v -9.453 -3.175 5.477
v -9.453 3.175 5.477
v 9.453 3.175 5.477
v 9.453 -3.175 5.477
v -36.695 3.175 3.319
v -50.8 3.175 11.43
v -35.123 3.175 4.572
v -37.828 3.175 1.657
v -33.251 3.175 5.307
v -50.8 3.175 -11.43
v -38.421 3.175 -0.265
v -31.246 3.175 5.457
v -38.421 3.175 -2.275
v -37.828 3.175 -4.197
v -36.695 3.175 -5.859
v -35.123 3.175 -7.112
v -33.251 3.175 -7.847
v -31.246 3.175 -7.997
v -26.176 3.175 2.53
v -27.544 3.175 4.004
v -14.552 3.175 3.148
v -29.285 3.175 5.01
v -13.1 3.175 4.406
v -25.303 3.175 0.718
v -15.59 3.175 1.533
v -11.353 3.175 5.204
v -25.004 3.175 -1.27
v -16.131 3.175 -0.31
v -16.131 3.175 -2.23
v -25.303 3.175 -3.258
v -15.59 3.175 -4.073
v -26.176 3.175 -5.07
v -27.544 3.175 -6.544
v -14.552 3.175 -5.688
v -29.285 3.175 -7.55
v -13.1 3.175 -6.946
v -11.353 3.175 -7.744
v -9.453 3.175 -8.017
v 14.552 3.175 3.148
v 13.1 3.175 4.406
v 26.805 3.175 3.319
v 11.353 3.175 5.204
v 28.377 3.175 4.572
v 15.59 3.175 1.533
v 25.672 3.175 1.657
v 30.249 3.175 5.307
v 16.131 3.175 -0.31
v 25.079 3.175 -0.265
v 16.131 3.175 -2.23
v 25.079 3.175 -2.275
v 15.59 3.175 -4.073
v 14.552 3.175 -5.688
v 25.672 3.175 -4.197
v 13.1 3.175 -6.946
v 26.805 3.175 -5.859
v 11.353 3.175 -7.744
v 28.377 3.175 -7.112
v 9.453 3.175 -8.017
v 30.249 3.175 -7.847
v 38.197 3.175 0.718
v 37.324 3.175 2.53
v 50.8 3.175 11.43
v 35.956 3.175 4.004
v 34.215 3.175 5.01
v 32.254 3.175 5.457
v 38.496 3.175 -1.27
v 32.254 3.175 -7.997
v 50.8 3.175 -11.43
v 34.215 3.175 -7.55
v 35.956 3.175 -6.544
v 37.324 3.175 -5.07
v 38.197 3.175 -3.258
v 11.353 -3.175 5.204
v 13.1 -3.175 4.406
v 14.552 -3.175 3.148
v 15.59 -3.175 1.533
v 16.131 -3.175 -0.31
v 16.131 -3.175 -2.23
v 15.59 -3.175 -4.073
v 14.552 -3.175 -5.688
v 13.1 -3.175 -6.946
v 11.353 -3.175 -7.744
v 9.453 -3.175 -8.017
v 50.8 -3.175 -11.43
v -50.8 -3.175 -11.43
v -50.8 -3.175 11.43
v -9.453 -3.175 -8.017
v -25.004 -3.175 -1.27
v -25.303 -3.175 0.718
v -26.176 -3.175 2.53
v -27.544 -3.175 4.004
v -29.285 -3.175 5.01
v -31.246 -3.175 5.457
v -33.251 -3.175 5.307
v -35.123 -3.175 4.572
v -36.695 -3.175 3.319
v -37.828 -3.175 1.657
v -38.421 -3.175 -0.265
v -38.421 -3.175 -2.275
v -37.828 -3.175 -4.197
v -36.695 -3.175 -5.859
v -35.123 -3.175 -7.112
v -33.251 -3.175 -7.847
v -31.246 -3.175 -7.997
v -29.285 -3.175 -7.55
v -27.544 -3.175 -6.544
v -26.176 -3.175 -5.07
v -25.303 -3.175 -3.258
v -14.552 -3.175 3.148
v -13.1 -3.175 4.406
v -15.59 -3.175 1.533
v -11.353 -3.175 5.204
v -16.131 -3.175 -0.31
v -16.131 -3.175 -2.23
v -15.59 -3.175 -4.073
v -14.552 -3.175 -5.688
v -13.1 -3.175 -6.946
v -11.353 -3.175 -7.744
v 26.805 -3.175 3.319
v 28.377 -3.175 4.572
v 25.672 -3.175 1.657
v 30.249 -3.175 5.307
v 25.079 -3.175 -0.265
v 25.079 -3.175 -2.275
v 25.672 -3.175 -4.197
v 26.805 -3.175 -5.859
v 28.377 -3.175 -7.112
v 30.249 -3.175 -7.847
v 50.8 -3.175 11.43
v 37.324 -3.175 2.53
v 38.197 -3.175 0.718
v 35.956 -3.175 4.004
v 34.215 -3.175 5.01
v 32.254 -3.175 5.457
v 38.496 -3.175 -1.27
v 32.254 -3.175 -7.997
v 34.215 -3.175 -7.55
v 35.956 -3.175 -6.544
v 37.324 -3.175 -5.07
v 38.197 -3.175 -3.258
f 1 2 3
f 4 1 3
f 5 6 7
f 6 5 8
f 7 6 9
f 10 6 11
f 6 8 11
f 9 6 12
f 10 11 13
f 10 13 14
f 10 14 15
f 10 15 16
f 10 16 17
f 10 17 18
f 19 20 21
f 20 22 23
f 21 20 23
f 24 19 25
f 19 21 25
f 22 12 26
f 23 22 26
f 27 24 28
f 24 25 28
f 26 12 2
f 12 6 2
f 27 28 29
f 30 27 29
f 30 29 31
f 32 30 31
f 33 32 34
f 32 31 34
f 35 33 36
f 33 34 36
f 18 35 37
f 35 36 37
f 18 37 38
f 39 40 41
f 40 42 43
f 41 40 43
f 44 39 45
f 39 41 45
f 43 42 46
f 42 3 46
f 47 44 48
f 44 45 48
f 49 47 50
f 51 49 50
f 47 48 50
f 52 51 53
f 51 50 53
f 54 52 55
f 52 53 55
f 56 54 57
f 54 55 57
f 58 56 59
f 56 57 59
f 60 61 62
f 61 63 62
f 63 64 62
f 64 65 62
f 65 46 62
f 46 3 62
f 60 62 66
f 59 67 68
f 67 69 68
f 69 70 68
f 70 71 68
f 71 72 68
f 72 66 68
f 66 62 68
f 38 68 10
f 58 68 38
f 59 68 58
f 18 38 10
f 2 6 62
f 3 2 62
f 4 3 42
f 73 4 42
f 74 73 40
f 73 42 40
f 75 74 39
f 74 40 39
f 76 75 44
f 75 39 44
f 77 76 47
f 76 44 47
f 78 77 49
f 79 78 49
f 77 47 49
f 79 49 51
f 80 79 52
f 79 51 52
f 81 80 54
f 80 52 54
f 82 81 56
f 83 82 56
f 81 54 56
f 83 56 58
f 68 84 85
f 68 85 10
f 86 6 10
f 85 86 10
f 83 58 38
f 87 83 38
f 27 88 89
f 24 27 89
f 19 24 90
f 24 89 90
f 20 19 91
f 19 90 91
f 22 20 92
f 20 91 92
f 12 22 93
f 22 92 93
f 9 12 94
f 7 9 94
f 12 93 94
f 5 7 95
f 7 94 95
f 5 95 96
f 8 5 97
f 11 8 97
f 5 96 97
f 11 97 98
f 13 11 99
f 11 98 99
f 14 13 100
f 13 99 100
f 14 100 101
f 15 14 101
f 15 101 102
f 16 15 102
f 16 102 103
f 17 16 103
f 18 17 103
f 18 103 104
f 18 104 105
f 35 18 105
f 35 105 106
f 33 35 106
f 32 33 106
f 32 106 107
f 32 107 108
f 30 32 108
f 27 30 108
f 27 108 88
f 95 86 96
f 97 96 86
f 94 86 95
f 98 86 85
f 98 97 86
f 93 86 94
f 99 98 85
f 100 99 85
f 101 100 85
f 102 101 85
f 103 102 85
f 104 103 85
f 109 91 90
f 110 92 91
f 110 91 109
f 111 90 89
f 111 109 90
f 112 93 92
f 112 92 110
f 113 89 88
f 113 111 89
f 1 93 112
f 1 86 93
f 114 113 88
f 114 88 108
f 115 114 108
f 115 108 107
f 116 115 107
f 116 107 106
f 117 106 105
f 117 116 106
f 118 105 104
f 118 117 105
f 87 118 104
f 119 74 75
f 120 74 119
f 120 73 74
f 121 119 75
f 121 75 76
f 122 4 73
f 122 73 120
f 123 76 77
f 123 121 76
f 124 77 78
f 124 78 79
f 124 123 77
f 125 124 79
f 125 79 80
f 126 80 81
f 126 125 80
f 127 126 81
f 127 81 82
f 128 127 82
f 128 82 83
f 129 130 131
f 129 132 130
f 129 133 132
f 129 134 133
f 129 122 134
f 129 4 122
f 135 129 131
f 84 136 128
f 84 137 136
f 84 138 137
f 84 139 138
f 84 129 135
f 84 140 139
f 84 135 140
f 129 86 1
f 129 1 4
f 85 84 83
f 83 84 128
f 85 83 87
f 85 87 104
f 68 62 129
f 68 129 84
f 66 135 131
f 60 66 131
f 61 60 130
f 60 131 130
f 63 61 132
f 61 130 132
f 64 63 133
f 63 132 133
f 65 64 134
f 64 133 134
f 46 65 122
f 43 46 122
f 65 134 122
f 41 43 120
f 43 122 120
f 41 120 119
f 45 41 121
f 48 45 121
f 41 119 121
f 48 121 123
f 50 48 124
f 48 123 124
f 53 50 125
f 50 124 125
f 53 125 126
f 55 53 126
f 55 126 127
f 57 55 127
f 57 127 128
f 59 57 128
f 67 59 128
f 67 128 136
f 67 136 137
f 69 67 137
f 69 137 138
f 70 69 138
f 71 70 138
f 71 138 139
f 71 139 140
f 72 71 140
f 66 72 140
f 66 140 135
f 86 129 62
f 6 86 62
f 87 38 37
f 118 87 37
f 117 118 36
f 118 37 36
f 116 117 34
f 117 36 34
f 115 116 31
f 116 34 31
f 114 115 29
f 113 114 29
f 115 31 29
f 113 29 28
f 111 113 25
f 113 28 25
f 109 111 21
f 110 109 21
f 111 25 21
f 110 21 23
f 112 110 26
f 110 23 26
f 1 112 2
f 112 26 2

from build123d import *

# Parameters (mm, degrees)
SKETCH1_W               = 22.86
SKETCH1_H               = 6.35
EXTRUDE1_DEPTH          = 50.8
EXTRUDE1_DEPTH_BACK     = 50.8
F_1_2_CLEARANCE_HOLE1_D = 13.49248
CUT_EXTRUDE1_DEPTH      = 7.35


with BuildPart() as part:
    # Sketch1 → Extrude1 (new body, two sides)
    with BuildSketch(Plane(origin=(0, 0, 0), x_dir=(0, 0, -1), z_dir=(1, 0, 0))) as extrude1_sk:
        Rectangle(SKETCH1_W, SKETCH1_H)
    extrude(amount=EXTRUDE1_DEPTH)
    extrude(extrude1_sk.sketch, amount=-EXTRUDE1_DEPTH_BACK)

    # 1_2 Clearance Hole1 (through all)
    with Locations(Plane(origin=(0, 3.175, 0), x_dir=(-1, 0, 0), z_dir=(0, 1, 0))):
        with Locations((31.75, -1.27), (-31.75, -1.27)):
            Hole(F_1_2_CLEARANCE_HOLE1_D / 2)

    # Sketch6 → Cut-Extrude1 (cut, through all)
    with BuildSketch(Plane(origin=(0, 3.175, 0), x_dir=(-1, 0, 0), z_dir=(0, 1, 0))):
        with BuildLine():
            Line((-9.452589884, -8.016875), (9.452589807, -8.016875))
            ThreePointArc((9.452589807, -8.016875), (16.199464807, -1.27), (9.452589807, 5.476875))
            Line((9.452589807, 5.476875), (-9.452589884, 5.476875))
            ThreePointArc((-9.452589884, 5.476875), (-16.199464884, -1.27), (-9.452589884, -8.016875))
        make_face()
    extrude(amount=-CUT_EXTRUDE1_DEPTH, mode=Mode.SUBTRACT)


solid = part.part
